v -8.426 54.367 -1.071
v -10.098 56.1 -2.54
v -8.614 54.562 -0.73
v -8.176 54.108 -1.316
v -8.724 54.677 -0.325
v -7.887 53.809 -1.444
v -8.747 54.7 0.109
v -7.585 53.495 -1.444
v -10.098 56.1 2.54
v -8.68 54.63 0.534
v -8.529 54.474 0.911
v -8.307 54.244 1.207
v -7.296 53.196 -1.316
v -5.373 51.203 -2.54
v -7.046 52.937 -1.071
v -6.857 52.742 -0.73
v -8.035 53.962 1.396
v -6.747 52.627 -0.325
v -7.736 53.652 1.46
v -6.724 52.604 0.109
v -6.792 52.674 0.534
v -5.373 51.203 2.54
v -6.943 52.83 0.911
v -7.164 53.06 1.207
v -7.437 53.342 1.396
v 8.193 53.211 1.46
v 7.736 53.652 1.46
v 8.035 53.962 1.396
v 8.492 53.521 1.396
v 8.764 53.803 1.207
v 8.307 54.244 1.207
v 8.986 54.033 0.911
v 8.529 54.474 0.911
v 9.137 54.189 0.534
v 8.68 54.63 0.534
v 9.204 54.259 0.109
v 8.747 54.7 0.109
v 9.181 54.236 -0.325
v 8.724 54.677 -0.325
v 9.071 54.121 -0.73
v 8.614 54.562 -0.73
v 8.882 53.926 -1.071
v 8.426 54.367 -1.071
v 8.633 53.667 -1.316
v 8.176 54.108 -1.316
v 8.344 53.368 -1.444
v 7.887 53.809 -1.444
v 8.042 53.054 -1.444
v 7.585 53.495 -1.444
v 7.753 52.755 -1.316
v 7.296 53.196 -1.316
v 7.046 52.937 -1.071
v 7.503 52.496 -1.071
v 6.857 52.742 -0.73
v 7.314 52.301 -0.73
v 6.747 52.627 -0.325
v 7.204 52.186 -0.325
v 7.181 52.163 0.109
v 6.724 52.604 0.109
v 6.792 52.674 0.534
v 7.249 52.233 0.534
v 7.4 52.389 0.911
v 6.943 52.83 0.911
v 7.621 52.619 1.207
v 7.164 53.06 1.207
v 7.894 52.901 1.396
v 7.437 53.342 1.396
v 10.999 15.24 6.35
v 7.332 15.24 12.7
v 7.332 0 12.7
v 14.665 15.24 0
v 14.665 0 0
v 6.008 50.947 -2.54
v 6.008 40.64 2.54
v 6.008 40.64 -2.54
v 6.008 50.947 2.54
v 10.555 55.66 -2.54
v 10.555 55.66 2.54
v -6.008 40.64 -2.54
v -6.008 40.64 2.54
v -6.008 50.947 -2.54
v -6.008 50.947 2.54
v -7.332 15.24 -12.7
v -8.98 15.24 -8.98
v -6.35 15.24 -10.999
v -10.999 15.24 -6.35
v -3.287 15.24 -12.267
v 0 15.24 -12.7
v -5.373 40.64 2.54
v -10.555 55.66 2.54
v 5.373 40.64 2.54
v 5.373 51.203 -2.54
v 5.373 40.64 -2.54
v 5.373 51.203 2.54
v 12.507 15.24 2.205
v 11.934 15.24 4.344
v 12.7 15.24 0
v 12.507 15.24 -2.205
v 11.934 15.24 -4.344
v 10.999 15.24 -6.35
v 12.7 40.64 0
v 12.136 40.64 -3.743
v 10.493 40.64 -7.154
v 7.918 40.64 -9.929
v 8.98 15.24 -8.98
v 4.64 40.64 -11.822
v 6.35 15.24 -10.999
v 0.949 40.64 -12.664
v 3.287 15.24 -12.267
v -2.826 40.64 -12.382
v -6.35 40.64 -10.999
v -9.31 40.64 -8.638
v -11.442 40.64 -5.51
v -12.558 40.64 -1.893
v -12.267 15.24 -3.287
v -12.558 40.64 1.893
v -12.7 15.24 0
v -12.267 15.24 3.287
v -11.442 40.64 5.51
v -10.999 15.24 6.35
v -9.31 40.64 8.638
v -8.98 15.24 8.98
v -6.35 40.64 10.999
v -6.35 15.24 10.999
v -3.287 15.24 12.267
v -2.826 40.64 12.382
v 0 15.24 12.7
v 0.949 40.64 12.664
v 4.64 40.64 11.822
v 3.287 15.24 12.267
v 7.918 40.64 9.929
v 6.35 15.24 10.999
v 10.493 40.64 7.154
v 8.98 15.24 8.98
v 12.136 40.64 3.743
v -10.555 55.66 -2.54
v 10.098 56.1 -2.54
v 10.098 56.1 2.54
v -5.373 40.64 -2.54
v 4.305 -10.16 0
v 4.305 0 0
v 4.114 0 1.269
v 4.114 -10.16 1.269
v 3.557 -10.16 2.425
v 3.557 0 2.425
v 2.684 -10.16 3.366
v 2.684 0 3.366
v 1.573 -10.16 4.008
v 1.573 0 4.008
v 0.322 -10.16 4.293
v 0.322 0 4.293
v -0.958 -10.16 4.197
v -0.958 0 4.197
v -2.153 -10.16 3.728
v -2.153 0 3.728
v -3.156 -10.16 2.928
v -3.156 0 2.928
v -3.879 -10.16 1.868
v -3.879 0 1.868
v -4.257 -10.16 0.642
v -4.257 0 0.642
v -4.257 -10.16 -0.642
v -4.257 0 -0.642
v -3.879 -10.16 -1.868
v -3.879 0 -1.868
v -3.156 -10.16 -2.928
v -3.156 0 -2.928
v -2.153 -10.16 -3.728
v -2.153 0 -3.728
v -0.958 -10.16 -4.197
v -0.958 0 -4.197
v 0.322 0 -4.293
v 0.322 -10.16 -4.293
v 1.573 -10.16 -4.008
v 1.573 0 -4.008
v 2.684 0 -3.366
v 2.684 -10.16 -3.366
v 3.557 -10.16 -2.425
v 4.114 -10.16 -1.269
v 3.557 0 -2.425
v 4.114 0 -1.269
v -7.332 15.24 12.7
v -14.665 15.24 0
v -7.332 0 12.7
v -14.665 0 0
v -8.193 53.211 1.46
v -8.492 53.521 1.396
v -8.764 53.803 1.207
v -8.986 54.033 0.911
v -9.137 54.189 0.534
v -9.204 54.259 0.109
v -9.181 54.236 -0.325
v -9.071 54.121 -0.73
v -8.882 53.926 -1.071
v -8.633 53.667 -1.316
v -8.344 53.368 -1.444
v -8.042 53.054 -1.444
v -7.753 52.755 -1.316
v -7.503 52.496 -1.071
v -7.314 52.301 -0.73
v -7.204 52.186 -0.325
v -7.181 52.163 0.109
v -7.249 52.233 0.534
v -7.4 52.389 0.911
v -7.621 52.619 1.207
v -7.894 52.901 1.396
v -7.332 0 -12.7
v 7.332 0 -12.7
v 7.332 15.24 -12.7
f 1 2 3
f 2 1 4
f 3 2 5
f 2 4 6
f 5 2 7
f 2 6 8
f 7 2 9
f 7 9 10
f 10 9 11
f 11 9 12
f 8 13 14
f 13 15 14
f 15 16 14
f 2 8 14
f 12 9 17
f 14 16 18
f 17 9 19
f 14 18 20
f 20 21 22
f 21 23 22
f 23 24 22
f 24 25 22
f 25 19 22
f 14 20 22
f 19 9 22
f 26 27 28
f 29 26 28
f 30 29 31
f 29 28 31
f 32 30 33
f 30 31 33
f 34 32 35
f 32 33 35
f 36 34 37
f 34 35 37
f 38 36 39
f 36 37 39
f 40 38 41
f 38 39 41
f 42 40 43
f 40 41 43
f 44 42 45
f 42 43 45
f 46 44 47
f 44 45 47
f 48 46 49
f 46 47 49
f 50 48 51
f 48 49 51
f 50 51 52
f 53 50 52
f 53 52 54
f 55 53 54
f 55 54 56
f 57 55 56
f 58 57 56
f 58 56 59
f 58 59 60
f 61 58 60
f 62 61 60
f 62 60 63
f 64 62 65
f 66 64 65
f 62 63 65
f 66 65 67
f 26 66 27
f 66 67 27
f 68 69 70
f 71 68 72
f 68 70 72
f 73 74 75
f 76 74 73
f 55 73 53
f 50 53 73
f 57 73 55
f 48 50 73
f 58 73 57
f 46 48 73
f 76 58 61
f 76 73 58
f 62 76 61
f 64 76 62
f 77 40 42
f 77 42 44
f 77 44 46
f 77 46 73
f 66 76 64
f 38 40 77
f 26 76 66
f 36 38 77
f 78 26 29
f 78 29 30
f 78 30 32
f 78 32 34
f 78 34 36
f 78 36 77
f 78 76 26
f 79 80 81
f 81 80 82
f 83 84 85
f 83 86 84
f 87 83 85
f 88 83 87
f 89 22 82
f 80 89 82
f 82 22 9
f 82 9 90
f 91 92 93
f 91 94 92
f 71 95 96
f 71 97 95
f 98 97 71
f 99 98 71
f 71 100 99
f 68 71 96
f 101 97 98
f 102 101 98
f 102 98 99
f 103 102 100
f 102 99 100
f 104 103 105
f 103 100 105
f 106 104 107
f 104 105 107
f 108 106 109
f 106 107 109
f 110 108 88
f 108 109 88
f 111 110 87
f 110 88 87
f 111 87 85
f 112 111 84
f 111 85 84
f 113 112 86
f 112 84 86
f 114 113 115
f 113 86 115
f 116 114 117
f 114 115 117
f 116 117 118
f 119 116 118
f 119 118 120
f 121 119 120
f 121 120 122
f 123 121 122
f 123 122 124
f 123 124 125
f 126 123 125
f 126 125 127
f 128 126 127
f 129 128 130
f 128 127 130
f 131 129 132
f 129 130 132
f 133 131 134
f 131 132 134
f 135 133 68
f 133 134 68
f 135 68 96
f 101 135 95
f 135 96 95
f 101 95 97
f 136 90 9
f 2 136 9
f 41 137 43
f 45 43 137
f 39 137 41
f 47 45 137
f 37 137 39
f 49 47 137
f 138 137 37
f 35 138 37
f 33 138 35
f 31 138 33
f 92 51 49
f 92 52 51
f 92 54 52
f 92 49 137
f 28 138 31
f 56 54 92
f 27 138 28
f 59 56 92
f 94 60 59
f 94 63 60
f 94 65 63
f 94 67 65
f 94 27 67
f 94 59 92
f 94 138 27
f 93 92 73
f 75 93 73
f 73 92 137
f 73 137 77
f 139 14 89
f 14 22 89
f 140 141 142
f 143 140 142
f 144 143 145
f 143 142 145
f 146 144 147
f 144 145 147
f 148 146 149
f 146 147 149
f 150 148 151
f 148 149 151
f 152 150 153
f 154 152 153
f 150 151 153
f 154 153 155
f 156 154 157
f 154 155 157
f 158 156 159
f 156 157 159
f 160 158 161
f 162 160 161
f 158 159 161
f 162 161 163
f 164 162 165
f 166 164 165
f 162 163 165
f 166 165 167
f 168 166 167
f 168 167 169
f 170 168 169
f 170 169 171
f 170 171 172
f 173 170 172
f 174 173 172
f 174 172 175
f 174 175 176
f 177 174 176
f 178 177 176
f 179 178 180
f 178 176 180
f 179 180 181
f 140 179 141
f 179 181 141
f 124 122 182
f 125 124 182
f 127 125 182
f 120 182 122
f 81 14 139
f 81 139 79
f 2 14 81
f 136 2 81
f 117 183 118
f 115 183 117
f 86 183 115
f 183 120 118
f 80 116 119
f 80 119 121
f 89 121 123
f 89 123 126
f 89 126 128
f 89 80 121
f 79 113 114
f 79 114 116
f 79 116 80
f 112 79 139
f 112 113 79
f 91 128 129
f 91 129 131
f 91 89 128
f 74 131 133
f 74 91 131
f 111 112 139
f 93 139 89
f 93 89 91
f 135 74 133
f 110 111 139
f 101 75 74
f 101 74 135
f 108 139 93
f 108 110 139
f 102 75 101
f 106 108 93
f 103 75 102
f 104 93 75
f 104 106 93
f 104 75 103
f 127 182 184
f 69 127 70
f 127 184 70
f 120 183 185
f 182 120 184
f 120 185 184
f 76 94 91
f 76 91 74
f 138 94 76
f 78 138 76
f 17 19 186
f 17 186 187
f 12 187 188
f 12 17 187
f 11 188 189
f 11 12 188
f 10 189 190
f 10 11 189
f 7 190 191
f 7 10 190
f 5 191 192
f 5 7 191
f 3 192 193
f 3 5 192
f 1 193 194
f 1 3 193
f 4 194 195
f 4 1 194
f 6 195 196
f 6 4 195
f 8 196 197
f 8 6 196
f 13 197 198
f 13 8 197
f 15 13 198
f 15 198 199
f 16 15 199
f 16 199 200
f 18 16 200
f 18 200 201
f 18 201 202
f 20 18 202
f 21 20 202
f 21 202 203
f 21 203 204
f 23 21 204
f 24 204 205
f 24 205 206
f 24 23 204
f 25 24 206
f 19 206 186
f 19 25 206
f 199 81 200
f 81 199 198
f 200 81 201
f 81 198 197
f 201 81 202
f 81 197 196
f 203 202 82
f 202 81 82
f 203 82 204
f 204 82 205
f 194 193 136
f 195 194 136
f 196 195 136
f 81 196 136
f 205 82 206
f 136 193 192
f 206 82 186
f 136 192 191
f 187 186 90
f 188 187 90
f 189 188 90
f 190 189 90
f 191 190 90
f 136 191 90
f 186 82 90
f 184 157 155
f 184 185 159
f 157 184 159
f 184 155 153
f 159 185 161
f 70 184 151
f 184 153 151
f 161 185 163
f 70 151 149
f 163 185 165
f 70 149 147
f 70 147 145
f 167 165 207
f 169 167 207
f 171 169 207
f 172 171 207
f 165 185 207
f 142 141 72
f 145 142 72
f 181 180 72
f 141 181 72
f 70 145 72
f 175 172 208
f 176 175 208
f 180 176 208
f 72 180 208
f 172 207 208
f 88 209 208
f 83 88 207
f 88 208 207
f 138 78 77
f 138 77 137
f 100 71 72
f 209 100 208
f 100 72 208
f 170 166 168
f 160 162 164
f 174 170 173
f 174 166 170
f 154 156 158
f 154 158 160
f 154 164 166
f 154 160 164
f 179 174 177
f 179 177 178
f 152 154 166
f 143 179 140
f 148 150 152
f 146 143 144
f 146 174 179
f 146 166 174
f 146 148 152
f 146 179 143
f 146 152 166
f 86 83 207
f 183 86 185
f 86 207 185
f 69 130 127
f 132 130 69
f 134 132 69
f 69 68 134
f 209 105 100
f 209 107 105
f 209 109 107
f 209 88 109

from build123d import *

# Parameters (mm, degrees)
BOSS_EXTRUDE1_DEPTH = 15.24
SKETCH3_R           = 12.7
BOSS_EXTRUDE2_DEPTH = 25.4
SKETCH4_R           = 4.3053
BOSS_EXTRUDE3_DEPTH = 10.16
EXTRUDE_THIN1_DEPTH = 2.54
SKETCH6_R           = 1.4605
CUT_EXTRUDE1_DEPTH  = 0.635


with BuildPart() as part:
    # Sketch2 → Boss-Extrude1 (new body)
    with BuildSketch(Plane(origin=(0, 0, 0), x_dir=(1, 0, 0), z_dir=(0, 1, 0))):
        Polygon((7.332348419, 12.7), (-7.332348419, 12.7), (-14.664696837, 0), (-7.332348419, -12.7), (7.332348419, -12.7), (14.664696837, 0), align=None)
    extrude(amount=BOSS_EXTRUDE1_DEPTH)

    # Sketch3 → Boss-Extrude2 (add)
    with BuildSketch(Plane(origin=(0, 15.24, 0), x_dir=(1, 0, 0), z_dir=(0, 1, 0))):
        Circle(SKETCH3_R)
    extrude(amount=BOSS_EXTRUDE2_DEPTH)

    # Sketch4 → Boss-Extrude3 (add)
    with BuildSketch(Plane.XZ):
        Circle(SKETCH4_R)
    extrude(amount=BOSS_EXTRUDE3_DEPTH)

    # Sketch5 → Extrude-Thin1 (add, symmetric)
    with BuildSketch(Plane.XY):
        Polygon((6.008182396, 40.64), (6.008182396, 50.946997676), (10.555270964, 55.659540341), (10.098307994, 56.100459659), (5.373182396, 51.203401761), (5.373182396, 40.64), align=None)
    extrude_thin1 = extrude(amount=EXTRUDE_THIN1_DEPTH, both=True)

    # Sketch6 → Cut-Extrude1 (cut)
    with BuildSketch(Plane(origin=(-22.802787707, 22.00219768, 0), x_dir=(0, 0, 1), z_dir=(-0.719626724, 0.69436113, 0))):
        with Locations((0, 43.980763894)):
            Circle(SKETCH6_R)
    cut_extrude1 = extrude(amount=-CUT_EXTRUDE1_DEPTH, mode=Mode.SUBTRACT)

    # Mirror1: Extrude-Thin1, Cut-Extrude1 across plane
    add(extrude_thin1.mirror(Plane(origin=(0, 0, 0), x_dir=(0, 0, 1), z_dir=(1, 0, 0))))
    add(cut_extrude1.mirror(Plane(origin=(0, 0, 0), x_dir=(0, 0, 1), z_dir=(1, 0, 0))), mode=Mode.SUBTRACT)


solid = part.part
